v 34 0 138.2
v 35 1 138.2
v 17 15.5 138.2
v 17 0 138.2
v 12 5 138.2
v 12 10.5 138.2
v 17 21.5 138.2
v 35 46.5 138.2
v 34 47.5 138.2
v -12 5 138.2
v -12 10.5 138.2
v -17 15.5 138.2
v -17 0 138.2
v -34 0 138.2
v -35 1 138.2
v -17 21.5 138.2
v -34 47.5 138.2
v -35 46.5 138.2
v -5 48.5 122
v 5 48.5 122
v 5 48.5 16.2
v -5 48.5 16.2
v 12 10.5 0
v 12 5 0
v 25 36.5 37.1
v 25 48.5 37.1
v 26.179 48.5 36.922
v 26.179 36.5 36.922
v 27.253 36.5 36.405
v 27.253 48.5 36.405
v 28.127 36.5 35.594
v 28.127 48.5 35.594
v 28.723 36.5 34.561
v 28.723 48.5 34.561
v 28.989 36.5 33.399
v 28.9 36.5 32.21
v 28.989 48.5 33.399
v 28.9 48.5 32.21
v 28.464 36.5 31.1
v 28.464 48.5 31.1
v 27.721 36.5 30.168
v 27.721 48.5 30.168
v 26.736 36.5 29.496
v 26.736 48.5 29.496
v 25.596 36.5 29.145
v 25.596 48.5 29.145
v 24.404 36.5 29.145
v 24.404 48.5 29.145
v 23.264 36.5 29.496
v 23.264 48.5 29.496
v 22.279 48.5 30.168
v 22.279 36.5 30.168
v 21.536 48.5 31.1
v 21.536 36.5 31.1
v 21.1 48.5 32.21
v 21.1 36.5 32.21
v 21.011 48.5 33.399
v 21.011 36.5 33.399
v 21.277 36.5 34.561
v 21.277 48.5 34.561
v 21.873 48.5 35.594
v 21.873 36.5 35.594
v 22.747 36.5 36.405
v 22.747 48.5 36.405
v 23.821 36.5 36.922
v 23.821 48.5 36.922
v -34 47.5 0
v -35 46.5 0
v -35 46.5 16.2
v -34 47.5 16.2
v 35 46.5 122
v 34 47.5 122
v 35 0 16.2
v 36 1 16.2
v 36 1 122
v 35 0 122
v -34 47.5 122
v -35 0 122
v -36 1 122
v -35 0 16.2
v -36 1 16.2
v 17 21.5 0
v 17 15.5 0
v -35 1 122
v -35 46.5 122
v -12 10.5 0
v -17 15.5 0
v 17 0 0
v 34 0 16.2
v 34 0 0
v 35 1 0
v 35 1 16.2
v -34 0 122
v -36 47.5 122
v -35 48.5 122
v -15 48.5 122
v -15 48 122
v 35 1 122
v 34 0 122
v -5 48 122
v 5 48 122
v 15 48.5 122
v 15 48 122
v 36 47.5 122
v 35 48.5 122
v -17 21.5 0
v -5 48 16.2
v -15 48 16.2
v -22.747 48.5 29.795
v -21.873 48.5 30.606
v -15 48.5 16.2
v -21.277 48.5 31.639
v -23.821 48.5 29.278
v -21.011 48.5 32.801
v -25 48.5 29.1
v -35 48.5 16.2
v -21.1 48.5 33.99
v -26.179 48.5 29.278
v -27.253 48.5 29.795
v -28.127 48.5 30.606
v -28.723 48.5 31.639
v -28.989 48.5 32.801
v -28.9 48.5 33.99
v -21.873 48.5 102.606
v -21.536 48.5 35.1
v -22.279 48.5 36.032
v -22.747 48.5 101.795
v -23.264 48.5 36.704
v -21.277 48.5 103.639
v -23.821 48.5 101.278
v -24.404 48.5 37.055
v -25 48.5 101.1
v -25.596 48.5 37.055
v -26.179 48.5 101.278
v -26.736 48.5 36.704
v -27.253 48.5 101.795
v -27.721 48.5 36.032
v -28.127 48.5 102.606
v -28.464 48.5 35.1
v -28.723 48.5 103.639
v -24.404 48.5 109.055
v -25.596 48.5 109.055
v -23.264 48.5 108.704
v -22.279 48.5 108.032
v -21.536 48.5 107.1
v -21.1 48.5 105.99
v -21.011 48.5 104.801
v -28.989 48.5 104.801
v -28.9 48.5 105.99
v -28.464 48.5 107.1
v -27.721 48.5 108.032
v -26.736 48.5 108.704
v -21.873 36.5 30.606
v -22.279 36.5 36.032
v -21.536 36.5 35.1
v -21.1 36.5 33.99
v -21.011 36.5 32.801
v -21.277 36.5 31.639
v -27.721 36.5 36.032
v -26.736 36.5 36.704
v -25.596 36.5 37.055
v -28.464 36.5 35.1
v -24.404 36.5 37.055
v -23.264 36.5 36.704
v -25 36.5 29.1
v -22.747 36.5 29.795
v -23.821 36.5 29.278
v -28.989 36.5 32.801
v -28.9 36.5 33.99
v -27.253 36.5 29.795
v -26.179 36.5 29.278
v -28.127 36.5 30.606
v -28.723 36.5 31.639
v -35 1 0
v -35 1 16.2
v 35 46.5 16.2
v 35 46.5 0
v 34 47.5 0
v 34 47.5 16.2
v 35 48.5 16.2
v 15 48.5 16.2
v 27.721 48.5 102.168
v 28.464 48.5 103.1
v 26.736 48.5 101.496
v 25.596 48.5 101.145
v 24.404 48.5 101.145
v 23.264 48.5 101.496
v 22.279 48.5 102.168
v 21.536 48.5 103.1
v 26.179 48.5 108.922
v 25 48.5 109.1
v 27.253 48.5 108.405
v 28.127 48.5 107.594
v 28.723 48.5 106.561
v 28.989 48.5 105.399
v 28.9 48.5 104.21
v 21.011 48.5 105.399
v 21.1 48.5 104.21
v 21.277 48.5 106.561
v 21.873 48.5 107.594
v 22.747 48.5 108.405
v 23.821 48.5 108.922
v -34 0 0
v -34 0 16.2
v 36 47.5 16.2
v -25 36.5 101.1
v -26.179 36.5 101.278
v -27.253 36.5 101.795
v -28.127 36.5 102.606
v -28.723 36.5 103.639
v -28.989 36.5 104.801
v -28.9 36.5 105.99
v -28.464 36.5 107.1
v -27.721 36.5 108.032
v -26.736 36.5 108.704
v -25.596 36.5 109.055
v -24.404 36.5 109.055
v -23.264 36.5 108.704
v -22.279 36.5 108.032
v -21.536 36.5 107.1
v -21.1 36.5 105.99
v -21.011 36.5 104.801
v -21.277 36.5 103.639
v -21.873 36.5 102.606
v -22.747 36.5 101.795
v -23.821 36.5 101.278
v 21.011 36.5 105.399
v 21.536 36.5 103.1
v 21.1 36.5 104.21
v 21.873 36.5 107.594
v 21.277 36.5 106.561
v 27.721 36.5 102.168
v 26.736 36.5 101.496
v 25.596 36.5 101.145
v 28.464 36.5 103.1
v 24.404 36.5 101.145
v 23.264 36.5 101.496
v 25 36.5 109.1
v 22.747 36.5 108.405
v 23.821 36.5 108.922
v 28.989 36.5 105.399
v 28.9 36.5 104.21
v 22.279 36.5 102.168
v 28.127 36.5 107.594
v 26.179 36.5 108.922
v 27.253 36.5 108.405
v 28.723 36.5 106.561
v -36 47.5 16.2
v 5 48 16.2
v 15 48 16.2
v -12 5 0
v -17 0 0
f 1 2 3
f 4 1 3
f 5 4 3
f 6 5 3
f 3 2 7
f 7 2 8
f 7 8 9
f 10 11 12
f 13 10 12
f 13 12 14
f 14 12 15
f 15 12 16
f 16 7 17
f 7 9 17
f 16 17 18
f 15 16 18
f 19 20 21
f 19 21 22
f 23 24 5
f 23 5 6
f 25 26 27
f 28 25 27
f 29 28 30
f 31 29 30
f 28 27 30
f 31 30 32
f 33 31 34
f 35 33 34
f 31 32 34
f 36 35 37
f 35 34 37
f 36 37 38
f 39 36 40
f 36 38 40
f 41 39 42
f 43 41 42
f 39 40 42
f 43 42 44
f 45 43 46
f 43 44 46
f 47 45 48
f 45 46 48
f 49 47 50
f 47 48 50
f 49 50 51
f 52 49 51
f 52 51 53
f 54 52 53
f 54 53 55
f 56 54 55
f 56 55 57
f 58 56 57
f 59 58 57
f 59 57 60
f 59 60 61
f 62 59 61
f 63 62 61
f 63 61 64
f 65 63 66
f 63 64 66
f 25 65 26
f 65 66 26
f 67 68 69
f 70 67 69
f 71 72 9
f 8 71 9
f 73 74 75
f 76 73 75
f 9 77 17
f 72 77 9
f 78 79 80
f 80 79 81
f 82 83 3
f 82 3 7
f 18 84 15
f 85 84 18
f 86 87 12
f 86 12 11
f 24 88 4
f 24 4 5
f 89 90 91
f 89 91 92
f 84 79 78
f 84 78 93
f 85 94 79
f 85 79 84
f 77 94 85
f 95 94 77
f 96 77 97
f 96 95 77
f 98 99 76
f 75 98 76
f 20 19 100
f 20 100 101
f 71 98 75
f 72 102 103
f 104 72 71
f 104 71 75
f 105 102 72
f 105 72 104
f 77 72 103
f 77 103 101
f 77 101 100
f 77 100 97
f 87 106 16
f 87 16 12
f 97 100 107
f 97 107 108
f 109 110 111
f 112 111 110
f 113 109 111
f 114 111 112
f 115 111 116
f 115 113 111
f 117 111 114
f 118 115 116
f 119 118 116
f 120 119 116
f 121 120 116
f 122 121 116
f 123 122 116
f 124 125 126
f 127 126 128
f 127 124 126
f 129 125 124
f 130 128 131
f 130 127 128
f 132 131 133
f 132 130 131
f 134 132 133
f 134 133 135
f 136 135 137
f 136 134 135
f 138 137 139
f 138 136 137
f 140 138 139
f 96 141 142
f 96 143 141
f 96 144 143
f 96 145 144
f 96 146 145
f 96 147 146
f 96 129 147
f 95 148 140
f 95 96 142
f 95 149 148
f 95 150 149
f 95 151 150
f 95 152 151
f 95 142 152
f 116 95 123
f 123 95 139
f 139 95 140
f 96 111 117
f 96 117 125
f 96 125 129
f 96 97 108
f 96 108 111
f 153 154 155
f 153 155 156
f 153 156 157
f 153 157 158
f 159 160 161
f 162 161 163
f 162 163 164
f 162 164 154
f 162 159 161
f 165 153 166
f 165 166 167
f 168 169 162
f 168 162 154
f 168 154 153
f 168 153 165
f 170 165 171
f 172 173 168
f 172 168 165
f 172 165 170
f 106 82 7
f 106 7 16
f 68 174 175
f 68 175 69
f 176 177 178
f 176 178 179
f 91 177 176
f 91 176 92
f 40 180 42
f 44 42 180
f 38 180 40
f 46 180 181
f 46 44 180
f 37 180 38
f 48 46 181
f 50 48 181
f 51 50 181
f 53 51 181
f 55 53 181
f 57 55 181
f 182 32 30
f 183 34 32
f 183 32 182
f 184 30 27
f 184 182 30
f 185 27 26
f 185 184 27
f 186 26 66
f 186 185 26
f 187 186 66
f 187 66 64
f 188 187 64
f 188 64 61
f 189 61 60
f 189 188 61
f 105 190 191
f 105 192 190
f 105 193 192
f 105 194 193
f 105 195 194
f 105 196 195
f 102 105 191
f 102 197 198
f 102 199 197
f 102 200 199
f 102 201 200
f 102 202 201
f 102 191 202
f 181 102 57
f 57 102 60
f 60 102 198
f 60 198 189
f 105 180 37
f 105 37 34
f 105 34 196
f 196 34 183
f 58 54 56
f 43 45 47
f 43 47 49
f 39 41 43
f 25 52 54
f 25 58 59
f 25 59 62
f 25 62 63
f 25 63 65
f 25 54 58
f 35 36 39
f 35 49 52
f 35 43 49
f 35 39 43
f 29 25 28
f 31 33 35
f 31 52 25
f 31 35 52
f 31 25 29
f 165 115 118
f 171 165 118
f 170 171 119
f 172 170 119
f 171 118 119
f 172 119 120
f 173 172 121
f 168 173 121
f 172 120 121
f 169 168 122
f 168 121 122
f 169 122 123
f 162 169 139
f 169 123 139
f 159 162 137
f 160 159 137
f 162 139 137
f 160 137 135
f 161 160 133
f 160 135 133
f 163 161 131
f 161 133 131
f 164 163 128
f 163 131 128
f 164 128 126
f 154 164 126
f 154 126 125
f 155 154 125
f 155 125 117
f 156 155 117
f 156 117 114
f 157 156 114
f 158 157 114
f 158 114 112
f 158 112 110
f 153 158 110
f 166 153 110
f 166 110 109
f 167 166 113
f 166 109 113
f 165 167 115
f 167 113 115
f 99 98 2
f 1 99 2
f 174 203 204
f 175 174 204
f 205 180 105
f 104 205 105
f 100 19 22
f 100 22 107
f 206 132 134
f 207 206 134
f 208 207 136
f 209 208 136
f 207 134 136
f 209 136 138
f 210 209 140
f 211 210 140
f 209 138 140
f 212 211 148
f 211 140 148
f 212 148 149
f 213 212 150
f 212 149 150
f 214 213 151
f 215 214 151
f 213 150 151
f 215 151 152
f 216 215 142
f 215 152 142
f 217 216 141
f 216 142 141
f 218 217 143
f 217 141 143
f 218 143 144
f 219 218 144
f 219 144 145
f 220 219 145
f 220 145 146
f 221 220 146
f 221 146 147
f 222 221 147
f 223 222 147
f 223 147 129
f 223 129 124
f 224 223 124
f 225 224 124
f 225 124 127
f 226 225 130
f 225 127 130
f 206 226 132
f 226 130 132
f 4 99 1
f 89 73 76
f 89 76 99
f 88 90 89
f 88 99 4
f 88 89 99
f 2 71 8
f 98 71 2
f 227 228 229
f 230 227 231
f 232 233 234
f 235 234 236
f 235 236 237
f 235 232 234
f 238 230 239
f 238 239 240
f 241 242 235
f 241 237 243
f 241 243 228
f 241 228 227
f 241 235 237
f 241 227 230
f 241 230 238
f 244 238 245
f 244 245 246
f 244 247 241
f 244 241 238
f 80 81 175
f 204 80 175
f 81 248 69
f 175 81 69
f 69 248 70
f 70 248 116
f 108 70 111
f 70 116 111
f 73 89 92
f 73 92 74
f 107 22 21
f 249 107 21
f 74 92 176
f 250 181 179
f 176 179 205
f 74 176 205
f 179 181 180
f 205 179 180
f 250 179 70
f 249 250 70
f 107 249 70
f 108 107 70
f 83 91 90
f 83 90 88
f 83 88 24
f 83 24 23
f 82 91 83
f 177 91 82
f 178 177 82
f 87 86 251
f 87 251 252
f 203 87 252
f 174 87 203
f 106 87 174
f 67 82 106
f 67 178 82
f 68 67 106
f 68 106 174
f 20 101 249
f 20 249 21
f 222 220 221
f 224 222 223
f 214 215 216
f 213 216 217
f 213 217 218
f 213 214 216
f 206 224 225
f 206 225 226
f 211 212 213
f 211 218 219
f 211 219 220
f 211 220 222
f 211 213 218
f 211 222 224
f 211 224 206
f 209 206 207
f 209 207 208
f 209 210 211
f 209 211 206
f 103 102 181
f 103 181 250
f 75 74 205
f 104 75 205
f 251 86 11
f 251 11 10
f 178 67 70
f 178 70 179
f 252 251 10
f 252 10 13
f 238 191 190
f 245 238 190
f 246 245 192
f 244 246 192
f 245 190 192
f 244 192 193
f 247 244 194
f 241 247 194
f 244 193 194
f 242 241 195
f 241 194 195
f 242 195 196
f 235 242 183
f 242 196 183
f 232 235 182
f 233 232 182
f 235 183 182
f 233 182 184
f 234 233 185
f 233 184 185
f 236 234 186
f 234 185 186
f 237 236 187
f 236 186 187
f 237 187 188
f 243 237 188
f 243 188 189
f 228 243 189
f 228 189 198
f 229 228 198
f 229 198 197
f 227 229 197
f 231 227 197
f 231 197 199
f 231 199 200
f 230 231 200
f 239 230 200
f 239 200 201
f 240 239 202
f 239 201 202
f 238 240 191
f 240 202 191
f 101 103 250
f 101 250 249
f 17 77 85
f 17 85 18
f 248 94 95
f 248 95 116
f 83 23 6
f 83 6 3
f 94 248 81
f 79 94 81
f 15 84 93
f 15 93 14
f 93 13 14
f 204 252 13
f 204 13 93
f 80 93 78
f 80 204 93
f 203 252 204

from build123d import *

# Parameters (mm, degrees)
EXTRUDE_1_DEPTH     = 138.2
EXTRUDE_2_DEPTH     = 52.9
SKETCH_4_R          = 4
CUT_EXTRUDE_1_DEPTH = 12
CHAMFER_1_SIZE      = 1


with BuildPart() as part:
    # 草图1 → 凸台-拉伸1 (new body)
    with BuildSketch(Plane.XY):
        Polygon((-35, 47.5), (35, 47.5), (35, 0), (17, 0), (12, 5), (12, 10.5), (17, 15.5), (17, 21.5), (-17, 21.5), (-17, 15.5), (-12, 10.5), (-12, 5), (-17, 0), (-35, 0), align=None)
    extrude(amount=EXTRUDE_1_DEPTH)

    # 草图2 → 凸台-拉伸2 (add, symmetric)
    with BuildSketch(Plane.XY.offset(69.1)):
        Polygon((-36, 0), (-35, 0), (-35, 47.5), (35, 47.5), (35, 0), (36, 0), (36, 48.5), (15, 48.5), (15, 48), (5, 48), (5, 48.5), (-5, 48.5), (-5, 48), (-15, 48), (-15, 48.5), (-36, 48.5), align=None)
    extrude(amount=EXTRUDE_2_DEPTH, both=True)

    # 草图4 → 切除-拉伸1 (cut)
    with BuildSketch(Plane(origin=(0, 48.5, 0), x_dir=(1, 0, 0), z_dir=(0, 1, 0))):
        with Locations(Location((25, -33.1, 0), (0, 0, 270))):
            Circle(SKETCH_4_R)
        with Locations(Location((25, -105.1, 0), (0, 0, 270))):
            Circle(SKETCH_4_R)
        with Locations(Location((-25, -105.1, 0), (0, 0, 90))):
            Circle(SKETCH_4_R)
        with Locations(Location((-25, -33.1, 0), (0, 0, 90))):
            Circle(SKETCH_4_R)
    extrude(amount=-CUT_EXTRUDE_1_DEPTH, mode=Mode.SUBTRACT)

    # 倒角1
    chamfer_1_edges = [part.edges().sort_by_distance(p)[0] for p in [
        (35, 47.5, 8.1),
        (-35, 47.5, 8.1),
        (35, 0, 8.1),
        (-35, 0, 8.1),
        (36, 0, 69.1),
        (35, 0, 130.1),
        (-35, 0, 130.1),
        (-36, 0, 69.1),
        (36, 48.5, 69.1),
        (-36, 48.5, 69.1),
        (35, 47.5, 130.1),
        (-35, 47.5, 130.1),
    ]]
    chamfer(chamfer_1_edges, length=CHAMFER_1_SIZE - 0.0001)  # a hair under: the kernel refuses the full size


solid = part.part
